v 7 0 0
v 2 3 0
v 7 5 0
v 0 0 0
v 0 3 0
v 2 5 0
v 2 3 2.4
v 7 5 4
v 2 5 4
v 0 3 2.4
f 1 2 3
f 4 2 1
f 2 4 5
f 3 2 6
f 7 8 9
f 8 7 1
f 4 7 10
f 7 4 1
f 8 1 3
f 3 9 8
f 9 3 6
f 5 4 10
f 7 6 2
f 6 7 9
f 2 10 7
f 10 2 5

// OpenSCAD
difference() {
    polyhedron(points=[[0, 0, 0], [7, 0, 0], [7, 5, 0], [0, 5, 0], [0, 5, 4], [7, 5, 4]], faces=[[0, 1, 2, 3], [5, 4, 3, 2], [0, 4, 5, 1], [0, 3, 4], [5, 2, 1]]);
    // This is here just to provide the validity of the polyhedron:
    translate(v=[0, 5, 0]) {
        cube(size=[4, 4, 10], center=true);
    };
};
